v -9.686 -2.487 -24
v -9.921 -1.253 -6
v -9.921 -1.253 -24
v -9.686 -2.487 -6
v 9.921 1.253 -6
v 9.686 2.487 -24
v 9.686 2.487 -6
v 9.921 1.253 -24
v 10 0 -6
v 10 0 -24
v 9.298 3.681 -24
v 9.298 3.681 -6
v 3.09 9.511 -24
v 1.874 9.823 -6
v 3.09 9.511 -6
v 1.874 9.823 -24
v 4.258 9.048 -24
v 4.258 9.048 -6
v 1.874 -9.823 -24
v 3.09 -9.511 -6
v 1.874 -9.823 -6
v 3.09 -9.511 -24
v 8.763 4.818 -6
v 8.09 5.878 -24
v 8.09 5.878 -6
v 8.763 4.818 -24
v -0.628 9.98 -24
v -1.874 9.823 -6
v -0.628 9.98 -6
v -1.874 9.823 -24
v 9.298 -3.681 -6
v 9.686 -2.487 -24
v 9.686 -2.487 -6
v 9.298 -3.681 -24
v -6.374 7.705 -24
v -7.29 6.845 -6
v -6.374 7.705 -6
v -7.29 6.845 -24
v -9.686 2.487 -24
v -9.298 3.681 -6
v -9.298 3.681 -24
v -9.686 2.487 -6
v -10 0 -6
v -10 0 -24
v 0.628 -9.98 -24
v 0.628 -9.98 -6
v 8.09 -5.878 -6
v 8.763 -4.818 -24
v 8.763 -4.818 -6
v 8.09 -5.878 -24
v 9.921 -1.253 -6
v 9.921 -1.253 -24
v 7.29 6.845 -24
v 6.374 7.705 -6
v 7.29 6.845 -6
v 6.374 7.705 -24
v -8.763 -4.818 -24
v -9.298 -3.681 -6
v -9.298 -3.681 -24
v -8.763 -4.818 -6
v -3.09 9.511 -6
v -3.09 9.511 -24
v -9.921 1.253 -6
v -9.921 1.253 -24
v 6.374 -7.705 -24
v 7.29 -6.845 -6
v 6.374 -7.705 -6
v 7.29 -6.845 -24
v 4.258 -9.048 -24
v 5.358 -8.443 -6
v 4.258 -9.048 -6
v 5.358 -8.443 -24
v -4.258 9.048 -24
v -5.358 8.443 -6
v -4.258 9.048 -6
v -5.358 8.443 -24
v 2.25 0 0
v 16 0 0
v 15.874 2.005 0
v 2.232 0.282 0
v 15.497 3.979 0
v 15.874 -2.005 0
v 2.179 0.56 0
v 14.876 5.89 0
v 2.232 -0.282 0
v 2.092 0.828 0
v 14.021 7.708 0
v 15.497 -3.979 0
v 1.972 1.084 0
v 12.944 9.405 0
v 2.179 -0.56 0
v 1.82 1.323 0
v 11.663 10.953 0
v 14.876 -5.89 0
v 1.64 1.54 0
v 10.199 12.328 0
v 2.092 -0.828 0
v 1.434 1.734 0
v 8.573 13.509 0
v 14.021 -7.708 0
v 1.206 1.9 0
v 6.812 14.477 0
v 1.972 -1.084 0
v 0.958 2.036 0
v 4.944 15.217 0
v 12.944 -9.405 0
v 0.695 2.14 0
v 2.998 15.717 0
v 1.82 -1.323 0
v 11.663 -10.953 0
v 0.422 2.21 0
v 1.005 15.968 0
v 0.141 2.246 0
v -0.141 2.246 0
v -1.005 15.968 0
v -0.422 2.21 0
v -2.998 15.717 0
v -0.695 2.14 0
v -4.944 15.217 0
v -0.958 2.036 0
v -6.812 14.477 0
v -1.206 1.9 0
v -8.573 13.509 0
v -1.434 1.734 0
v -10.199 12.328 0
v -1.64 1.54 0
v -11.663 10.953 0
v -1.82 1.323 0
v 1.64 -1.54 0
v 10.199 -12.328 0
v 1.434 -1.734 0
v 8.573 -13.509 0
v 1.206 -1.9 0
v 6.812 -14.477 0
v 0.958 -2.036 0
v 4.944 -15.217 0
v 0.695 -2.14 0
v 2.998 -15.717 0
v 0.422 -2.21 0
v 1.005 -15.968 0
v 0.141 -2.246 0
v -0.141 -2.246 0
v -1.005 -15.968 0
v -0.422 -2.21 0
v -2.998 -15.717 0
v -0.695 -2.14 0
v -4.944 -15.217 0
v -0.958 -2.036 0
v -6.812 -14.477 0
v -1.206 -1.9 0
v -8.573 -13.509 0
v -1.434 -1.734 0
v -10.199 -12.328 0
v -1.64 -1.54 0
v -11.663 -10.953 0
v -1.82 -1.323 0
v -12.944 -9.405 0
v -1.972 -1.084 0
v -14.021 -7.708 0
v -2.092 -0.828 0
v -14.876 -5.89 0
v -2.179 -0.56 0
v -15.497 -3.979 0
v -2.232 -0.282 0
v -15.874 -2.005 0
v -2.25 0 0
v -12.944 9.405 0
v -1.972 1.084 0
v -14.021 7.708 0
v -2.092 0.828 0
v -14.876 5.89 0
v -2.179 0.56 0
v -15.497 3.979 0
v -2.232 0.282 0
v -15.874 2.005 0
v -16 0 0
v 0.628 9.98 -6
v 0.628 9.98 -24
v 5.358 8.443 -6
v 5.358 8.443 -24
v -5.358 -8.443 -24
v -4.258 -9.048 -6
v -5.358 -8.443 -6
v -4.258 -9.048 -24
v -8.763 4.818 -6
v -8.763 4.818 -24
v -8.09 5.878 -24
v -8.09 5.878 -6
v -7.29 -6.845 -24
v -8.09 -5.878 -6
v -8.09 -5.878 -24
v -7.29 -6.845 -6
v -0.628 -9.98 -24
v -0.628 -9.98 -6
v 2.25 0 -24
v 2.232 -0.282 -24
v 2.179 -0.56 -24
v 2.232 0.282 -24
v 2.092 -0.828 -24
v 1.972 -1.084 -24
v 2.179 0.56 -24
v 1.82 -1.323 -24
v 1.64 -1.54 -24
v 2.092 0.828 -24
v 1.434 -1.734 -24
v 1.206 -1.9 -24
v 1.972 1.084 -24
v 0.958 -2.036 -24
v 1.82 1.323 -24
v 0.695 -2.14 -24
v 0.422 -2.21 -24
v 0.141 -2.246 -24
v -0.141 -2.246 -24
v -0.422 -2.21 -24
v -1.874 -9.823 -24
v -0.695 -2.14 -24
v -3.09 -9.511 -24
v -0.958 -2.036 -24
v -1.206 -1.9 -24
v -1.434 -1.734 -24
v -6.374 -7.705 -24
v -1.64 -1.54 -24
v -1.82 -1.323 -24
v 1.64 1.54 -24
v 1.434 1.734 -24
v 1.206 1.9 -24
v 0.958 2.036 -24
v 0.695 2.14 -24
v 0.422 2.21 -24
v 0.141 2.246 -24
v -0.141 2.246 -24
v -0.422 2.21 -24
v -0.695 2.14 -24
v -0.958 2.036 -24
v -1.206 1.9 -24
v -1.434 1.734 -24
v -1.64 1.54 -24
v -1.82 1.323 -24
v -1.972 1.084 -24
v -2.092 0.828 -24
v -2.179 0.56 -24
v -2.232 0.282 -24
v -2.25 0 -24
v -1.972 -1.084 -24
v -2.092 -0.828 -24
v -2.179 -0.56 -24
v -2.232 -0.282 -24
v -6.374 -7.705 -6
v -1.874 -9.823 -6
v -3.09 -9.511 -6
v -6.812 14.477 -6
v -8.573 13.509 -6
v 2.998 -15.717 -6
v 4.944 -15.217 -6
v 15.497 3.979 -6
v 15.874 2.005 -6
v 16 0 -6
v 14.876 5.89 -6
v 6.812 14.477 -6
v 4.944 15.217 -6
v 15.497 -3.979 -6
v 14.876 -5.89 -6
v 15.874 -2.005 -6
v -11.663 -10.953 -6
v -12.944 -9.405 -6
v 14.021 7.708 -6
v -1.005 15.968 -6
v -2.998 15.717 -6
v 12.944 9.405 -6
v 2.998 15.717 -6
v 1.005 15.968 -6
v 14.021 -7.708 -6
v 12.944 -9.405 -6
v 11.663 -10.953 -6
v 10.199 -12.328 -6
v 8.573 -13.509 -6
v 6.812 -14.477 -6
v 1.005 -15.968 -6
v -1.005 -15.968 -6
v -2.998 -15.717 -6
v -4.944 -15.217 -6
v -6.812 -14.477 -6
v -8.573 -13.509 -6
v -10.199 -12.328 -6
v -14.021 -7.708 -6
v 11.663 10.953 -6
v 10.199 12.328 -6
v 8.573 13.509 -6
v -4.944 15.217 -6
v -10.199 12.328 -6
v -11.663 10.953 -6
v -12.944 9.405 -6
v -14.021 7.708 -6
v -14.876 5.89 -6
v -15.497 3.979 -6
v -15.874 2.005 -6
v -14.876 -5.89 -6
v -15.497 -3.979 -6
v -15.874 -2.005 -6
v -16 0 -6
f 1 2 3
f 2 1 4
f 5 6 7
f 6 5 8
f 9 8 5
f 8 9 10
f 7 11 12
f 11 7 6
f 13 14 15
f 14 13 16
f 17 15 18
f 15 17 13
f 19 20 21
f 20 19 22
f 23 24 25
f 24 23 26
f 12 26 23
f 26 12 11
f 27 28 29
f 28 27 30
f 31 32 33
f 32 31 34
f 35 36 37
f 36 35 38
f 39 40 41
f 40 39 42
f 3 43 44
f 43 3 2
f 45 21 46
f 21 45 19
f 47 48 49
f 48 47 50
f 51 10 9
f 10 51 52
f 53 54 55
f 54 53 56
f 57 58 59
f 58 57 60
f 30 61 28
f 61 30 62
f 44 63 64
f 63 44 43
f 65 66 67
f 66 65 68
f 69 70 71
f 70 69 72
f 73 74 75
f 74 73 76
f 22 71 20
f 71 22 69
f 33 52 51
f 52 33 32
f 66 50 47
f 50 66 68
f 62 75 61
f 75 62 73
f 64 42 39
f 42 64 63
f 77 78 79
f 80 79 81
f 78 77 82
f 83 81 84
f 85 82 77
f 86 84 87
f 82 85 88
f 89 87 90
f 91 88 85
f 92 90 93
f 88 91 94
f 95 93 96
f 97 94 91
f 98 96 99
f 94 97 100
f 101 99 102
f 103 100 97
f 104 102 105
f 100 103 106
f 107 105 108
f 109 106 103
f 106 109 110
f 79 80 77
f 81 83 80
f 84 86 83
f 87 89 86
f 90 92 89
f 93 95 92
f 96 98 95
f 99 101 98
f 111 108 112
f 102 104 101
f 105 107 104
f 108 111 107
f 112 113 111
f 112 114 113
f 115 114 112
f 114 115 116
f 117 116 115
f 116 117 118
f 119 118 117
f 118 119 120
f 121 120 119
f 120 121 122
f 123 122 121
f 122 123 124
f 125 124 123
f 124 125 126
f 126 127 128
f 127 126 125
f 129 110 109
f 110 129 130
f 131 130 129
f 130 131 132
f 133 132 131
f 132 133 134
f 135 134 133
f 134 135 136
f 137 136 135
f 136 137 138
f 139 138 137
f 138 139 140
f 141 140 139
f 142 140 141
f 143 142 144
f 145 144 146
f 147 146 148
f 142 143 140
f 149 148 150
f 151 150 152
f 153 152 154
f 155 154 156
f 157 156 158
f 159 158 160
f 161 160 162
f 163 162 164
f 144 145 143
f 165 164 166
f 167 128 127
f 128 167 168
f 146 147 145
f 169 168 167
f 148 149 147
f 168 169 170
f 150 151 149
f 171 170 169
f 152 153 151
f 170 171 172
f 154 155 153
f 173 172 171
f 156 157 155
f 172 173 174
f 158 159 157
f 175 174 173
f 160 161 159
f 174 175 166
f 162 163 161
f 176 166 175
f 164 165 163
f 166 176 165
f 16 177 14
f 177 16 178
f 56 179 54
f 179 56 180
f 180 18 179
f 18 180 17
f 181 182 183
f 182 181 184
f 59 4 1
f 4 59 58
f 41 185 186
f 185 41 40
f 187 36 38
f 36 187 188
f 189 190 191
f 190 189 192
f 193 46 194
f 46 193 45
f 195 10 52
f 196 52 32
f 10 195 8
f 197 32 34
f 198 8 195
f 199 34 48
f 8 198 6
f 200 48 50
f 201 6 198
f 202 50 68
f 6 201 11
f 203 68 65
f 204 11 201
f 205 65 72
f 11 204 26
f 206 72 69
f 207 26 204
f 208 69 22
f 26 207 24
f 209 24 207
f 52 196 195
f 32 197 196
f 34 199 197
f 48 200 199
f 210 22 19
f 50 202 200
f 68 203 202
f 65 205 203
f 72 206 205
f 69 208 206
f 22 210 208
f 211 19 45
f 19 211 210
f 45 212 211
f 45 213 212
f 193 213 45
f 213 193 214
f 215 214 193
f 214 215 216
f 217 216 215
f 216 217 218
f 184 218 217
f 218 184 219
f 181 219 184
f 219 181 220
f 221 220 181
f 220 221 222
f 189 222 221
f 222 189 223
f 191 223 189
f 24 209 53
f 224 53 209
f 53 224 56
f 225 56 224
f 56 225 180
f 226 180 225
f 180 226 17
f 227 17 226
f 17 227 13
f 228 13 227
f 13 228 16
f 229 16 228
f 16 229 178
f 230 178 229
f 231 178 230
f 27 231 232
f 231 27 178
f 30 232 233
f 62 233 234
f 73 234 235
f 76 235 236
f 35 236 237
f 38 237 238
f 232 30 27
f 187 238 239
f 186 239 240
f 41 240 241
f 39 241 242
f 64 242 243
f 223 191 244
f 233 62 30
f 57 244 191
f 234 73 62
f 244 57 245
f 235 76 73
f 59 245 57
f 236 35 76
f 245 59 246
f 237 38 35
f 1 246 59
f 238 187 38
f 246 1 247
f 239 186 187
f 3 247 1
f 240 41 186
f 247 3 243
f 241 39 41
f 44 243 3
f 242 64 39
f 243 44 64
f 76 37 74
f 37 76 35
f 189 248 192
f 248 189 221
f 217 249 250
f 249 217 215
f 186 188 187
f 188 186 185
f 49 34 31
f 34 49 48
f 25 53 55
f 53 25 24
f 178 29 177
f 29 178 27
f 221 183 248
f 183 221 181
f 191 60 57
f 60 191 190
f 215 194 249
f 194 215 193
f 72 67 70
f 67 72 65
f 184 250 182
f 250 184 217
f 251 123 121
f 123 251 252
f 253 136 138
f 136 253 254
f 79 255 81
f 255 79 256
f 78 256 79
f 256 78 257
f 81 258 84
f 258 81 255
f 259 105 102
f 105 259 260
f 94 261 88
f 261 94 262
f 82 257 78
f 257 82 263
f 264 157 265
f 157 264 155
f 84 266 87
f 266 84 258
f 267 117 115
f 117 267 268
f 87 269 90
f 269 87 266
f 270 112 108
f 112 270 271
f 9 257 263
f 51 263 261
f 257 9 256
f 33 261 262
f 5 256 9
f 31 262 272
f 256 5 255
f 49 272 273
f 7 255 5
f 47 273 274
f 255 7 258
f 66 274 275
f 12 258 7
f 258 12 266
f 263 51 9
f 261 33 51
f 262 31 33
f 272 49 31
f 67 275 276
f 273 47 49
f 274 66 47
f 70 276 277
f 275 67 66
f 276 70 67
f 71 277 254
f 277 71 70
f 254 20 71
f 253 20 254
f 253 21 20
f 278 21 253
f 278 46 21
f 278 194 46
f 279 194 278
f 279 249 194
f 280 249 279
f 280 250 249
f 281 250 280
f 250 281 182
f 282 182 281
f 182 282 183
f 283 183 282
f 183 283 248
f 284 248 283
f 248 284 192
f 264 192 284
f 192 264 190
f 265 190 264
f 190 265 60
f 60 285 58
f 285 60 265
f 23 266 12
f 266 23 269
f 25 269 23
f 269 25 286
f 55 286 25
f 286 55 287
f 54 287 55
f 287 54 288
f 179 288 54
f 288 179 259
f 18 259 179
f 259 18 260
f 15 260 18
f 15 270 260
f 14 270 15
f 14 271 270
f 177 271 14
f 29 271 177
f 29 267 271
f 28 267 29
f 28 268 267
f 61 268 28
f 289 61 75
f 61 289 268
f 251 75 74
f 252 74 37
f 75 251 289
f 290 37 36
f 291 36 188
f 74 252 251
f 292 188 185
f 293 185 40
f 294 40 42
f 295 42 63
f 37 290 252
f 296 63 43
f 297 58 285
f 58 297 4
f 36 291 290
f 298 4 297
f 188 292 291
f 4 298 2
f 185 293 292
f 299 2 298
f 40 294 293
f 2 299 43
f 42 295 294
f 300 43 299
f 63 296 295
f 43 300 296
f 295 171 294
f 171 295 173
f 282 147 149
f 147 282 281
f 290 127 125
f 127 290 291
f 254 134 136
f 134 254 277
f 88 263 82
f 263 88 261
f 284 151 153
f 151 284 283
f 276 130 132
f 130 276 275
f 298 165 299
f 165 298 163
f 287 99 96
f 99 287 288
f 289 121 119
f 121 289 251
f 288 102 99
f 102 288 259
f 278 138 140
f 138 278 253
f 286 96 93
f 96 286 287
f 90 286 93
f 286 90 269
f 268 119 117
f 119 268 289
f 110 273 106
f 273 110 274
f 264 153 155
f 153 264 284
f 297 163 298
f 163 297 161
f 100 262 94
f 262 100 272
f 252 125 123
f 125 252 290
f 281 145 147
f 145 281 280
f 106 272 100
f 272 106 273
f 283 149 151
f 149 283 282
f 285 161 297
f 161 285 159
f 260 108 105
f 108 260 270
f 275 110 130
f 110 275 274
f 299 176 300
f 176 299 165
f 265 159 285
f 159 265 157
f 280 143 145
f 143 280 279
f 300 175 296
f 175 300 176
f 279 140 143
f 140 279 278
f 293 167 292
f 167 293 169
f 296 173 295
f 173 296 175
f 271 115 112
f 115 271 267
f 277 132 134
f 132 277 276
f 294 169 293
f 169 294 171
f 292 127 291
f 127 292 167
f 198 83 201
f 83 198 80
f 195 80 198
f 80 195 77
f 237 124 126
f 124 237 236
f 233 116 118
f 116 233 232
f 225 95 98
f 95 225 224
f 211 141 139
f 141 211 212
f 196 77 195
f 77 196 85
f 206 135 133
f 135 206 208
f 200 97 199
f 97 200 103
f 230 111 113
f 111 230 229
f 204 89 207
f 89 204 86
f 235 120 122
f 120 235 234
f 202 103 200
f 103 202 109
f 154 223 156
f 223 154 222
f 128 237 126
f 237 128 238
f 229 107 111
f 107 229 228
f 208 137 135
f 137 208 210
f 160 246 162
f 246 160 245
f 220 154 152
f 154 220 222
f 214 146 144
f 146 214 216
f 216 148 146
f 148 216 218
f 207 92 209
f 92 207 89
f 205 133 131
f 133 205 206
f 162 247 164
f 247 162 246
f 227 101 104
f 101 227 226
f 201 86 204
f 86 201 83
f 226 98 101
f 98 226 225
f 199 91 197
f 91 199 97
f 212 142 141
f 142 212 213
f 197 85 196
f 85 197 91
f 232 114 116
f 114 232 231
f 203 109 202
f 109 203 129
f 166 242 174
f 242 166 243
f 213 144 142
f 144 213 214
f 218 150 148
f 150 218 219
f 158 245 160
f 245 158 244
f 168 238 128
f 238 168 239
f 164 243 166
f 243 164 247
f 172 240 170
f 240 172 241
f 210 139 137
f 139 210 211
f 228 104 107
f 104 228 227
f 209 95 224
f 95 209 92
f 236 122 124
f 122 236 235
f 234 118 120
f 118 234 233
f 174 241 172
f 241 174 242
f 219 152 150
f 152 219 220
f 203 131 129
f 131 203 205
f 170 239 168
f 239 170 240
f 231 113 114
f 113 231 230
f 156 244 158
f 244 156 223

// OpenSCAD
$fn = 50;


difference() {
	union() {
		translate(v = [0, 0, -24.0000000000]) {
			cylinder(h = 24, r = 10.0000000000);
		}
		translate(v = [0, 0, -6.0000000000]) {
			cylinder(h = 6, r = 16.0000000000);
		}
	}
	union() {
		#translate(v = [0, 0, -24]) {
			cylinder(h = 24, r = 2.2500000000);
		}
	}
}
